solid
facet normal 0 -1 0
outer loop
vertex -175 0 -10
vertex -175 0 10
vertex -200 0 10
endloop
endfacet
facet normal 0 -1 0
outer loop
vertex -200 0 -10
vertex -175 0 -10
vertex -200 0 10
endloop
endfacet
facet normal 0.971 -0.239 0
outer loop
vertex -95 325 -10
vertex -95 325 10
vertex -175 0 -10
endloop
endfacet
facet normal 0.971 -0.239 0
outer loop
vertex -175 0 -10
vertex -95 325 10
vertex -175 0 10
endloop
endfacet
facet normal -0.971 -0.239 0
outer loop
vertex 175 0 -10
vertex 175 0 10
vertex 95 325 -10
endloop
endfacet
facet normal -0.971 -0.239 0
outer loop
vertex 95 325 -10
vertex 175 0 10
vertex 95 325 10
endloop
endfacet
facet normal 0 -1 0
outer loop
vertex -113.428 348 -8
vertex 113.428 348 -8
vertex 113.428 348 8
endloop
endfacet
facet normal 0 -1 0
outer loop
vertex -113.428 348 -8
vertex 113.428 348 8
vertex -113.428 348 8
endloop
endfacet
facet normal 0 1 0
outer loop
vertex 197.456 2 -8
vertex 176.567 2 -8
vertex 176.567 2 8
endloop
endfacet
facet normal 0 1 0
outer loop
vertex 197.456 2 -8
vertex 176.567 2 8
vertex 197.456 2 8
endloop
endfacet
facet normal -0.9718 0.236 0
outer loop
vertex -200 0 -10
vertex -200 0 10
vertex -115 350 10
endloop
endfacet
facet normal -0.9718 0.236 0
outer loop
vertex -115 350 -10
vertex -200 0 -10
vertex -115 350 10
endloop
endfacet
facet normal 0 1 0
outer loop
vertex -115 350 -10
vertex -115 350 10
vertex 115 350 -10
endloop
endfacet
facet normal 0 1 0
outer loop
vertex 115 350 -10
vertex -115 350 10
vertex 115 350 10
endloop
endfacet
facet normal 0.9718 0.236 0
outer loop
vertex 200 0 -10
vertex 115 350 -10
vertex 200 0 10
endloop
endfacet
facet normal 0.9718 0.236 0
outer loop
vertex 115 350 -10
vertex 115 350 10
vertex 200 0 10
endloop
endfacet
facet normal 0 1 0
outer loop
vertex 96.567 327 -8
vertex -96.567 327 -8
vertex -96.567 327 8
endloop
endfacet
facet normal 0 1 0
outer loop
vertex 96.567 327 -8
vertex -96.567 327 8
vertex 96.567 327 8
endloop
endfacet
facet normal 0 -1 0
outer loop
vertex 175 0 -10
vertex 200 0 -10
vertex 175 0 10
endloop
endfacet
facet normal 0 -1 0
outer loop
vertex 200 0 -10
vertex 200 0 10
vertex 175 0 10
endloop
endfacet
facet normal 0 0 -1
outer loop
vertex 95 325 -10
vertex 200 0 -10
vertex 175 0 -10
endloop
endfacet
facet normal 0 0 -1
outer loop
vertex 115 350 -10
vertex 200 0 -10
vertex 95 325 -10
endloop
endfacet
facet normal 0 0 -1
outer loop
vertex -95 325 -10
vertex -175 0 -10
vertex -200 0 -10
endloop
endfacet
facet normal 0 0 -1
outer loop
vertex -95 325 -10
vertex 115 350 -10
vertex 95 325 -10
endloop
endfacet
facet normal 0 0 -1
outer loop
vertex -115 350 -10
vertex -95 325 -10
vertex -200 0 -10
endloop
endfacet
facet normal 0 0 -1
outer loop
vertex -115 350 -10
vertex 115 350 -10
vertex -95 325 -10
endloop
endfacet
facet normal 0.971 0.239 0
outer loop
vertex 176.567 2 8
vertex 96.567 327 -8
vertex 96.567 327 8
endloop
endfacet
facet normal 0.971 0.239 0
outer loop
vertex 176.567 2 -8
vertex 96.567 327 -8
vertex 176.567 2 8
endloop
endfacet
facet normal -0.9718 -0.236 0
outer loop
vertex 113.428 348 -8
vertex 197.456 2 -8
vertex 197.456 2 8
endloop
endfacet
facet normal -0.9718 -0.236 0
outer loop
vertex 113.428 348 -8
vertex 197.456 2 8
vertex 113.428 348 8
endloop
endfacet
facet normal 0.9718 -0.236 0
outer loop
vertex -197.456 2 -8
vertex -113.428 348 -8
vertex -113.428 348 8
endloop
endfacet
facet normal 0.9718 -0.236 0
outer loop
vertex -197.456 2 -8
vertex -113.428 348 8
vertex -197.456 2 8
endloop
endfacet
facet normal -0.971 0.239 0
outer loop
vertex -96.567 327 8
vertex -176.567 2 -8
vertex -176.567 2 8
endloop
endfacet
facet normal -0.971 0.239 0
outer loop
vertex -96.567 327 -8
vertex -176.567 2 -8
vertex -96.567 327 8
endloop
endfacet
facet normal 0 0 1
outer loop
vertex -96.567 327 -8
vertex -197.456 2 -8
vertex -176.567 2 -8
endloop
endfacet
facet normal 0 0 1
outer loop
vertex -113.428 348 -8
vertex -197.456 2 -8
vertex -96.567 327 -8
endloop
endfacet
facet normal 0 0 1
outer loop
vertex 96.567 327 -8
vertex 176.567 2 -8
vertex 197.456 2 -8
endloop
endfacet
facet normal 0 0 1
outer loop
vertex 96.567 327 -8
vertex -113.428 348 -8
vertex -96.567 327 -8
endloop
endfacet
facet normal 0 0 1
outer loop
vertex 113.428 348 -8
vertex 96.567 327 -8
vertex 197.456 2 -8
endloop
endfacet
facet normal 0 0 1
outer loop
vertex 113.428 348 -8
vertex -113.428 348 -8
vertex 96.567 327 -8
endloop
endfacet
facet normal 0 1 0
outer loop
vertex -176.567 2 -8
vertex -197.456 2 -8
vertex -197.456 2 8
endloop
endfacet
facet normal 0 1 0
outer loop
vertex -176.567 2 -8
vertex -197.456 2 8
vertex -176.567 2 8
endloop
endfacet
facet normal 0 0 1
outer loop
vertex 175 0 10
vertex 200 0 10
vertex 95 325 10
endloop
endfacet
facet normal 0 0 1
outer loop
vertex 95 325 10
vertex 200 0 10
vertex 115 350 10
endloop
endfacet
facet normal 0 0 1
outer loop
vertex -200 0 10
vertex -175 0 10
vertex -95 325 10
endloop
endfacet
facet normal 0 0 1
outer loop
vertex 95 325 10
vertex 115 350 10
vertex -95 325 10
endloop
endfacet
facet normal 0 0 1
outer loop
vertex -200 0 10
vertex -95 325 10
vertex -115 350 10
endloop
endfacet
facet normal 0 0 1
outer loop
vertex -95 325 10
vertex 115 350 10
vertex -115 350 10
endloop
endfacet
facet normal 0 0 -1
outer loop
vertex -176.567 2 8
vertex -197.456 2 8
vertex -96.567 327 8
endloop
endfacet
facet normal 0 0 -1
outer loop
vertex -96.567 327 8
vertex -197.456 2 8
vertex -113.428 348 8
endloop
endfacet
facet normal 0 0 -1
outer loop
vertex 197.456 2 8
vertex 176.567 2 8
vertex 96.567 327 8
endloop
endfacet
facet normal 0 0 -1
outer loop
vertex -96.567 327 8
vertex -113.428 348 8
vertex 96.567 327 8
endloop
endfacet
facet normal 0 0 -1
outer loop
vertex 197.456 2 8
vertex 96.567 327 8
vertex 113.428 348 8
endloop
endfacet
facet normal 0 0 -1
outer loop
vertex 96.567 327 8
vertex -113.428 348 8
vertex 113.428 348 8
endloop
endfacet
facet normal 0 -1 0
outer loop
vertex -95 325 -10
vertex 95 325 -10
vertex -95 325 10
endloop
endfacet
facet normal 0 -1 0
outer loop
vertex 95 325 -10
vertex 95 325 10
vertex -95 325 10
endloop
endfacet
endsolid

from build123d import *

# Parameters (mm, degrees)
A_FRAME_BLANK_DEPTH   = 10
HOLLOW_WALL_2MM_START = -8
HOLLOW_WALL_2MM_DEPTH = 16


# Read off the part's stored shape, not the designer's step: Hollow_Wall_2mm
with BuildPart() as part:
    # A_Frame_Profile → A_Frame_Blank (new, symmetric)
    with BuildSketch(Plane.XY):
        Polygon((-200, 0), (-115, 350), (115, 350), (200, 0), (175, 0), (95, 325), (-95, 325), (-175, 0), align=None)
    extrude(amount=A_FRAME_BLANK_DEPTH, both=True)

    # Hollow_Wall_2mm outline → Hollow_Wall_2mm (cut)
    with BuildSketch(Plane.XY.offset(HOLLOW_WALL_2MM_START)):
        Polygon((-197.456151033, 2), (-176.567392981, 2), (-96.567392981, 327), (96.567392981, 327), (176.567392981, 2), (197.456151033, 2), (113.427579604, 348), (-113.427579604, 348), align=None)
    extrude(amount=HOLLOW_WALL_2MM_DEPTH, mode=Mode.SUBTRACT)


solid = part.part
